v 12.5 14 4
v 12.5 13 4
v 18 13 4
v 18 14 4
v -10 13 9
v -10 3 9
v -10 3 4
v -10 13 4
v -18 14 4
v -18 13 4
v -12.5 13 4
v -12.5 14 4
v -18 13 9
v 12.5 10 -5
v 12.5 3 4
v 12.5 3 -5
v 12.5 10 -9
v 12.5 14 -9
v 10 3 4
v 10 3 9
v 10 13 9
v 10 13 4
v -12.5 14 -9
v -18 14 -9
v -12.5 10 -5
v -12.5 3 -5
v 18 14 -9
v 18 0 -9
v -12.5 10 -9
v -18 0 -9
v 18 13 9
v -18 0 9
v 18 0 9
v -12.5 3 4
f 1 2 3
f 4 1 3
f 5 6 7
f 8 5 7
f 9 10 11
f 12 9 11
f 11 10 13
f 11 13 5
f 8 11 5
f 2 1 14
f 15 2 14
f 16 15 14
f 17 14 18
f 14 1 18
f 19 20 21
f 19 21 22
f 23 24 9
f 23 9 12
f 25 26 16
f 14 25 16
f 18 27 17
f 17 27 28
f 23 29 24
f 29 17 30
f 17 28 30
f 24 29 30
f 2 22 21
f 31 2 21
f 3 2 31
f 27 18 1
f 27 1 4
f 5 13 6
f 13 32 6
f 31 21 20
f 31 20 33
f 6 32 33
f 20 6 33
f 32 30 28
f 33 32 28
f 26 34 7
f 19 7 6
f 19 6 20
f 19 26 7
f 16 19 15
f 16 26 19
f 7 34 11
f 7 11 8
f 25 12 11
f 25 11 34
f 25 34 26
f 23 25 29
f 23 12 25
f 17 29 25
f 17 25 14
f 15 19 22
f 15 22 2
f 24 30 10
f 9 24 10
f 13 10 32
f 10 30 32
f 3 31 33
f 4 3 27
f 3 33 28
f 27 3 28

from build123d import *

# Parameters (mm, degrees)
SKETCH_1_W          = 36
SKETCH_1_H          = 18
EXTRUDE_1_DEPTH     = 3
SKETCH_2_W          = 8
SKETCH_2_H          = 5
EXTRUDE_2_DEPTH     = 10
EXTRUDE_3_DEPTH     = 11
SKETCH_4_W          = 25
SKETCH_4_H          = 4
CUT_EXTRUDE_1_DEPTH = 4


with BuildPart() as part:
    # 草图1 → 凸台-拉伸1 (new body)
    with BuildSketch(Plane(origin=(0, 0, 0), x_dir=(1, 0, 0), z_dir=(0, 1, 0))):
        Rectangle(SKETCH_1_W, SKETCH_1_H)
    extrude(amount=EXTRUDE_1_DEPTH)

    # 草图2 → 凸台-拉伸2 (add)
    with BuildSketch(Plane(origin=(0, 3, 0), x_dir=(1, 0, 0), z_dir=(0, 1, 0))):
        with Locations((-14, -6.5)):
            Rectangle(SKETCH_2_W, SKETCH_2_H)
        with Locations((14, -6.5)):
            Rectangle(SKETCH_2_W, SKETCH_2_H)
    extrude(amount=EXTRUDE_2_DEPTH)

    # 草图3 → 凸台-拉伸3 (add)
    with BuildSketch(Plane(origin=(0, 3, 0), x_dir=(1, 0, 0), z_dir=(0, 1, 0))):
        Polygon((-18, 9), (-18, -4), (-12.5, -4), (-12.5, 5), (12.5, 5), (12.5, -4), (18, -4), (18, 9), align=None)
    extrude(amount=EXTRUDE_3_DEPTH)

    # 草图4 → 切除-拉伸1 (cut)
    with BuildSketch(Plane(origin=(0, 14, 0), x_dir=(1, 0, 0), z_dir=(0, 1, 0))):
        with Locations((0, 7)):
            Rectangle(SKETCH_4_W, SKETCH_4_H)
    extrude(amount=-CUT_EXTRUDE_1_DEPTH, mode=Mode.SUBTRACT)


solid = part.part
